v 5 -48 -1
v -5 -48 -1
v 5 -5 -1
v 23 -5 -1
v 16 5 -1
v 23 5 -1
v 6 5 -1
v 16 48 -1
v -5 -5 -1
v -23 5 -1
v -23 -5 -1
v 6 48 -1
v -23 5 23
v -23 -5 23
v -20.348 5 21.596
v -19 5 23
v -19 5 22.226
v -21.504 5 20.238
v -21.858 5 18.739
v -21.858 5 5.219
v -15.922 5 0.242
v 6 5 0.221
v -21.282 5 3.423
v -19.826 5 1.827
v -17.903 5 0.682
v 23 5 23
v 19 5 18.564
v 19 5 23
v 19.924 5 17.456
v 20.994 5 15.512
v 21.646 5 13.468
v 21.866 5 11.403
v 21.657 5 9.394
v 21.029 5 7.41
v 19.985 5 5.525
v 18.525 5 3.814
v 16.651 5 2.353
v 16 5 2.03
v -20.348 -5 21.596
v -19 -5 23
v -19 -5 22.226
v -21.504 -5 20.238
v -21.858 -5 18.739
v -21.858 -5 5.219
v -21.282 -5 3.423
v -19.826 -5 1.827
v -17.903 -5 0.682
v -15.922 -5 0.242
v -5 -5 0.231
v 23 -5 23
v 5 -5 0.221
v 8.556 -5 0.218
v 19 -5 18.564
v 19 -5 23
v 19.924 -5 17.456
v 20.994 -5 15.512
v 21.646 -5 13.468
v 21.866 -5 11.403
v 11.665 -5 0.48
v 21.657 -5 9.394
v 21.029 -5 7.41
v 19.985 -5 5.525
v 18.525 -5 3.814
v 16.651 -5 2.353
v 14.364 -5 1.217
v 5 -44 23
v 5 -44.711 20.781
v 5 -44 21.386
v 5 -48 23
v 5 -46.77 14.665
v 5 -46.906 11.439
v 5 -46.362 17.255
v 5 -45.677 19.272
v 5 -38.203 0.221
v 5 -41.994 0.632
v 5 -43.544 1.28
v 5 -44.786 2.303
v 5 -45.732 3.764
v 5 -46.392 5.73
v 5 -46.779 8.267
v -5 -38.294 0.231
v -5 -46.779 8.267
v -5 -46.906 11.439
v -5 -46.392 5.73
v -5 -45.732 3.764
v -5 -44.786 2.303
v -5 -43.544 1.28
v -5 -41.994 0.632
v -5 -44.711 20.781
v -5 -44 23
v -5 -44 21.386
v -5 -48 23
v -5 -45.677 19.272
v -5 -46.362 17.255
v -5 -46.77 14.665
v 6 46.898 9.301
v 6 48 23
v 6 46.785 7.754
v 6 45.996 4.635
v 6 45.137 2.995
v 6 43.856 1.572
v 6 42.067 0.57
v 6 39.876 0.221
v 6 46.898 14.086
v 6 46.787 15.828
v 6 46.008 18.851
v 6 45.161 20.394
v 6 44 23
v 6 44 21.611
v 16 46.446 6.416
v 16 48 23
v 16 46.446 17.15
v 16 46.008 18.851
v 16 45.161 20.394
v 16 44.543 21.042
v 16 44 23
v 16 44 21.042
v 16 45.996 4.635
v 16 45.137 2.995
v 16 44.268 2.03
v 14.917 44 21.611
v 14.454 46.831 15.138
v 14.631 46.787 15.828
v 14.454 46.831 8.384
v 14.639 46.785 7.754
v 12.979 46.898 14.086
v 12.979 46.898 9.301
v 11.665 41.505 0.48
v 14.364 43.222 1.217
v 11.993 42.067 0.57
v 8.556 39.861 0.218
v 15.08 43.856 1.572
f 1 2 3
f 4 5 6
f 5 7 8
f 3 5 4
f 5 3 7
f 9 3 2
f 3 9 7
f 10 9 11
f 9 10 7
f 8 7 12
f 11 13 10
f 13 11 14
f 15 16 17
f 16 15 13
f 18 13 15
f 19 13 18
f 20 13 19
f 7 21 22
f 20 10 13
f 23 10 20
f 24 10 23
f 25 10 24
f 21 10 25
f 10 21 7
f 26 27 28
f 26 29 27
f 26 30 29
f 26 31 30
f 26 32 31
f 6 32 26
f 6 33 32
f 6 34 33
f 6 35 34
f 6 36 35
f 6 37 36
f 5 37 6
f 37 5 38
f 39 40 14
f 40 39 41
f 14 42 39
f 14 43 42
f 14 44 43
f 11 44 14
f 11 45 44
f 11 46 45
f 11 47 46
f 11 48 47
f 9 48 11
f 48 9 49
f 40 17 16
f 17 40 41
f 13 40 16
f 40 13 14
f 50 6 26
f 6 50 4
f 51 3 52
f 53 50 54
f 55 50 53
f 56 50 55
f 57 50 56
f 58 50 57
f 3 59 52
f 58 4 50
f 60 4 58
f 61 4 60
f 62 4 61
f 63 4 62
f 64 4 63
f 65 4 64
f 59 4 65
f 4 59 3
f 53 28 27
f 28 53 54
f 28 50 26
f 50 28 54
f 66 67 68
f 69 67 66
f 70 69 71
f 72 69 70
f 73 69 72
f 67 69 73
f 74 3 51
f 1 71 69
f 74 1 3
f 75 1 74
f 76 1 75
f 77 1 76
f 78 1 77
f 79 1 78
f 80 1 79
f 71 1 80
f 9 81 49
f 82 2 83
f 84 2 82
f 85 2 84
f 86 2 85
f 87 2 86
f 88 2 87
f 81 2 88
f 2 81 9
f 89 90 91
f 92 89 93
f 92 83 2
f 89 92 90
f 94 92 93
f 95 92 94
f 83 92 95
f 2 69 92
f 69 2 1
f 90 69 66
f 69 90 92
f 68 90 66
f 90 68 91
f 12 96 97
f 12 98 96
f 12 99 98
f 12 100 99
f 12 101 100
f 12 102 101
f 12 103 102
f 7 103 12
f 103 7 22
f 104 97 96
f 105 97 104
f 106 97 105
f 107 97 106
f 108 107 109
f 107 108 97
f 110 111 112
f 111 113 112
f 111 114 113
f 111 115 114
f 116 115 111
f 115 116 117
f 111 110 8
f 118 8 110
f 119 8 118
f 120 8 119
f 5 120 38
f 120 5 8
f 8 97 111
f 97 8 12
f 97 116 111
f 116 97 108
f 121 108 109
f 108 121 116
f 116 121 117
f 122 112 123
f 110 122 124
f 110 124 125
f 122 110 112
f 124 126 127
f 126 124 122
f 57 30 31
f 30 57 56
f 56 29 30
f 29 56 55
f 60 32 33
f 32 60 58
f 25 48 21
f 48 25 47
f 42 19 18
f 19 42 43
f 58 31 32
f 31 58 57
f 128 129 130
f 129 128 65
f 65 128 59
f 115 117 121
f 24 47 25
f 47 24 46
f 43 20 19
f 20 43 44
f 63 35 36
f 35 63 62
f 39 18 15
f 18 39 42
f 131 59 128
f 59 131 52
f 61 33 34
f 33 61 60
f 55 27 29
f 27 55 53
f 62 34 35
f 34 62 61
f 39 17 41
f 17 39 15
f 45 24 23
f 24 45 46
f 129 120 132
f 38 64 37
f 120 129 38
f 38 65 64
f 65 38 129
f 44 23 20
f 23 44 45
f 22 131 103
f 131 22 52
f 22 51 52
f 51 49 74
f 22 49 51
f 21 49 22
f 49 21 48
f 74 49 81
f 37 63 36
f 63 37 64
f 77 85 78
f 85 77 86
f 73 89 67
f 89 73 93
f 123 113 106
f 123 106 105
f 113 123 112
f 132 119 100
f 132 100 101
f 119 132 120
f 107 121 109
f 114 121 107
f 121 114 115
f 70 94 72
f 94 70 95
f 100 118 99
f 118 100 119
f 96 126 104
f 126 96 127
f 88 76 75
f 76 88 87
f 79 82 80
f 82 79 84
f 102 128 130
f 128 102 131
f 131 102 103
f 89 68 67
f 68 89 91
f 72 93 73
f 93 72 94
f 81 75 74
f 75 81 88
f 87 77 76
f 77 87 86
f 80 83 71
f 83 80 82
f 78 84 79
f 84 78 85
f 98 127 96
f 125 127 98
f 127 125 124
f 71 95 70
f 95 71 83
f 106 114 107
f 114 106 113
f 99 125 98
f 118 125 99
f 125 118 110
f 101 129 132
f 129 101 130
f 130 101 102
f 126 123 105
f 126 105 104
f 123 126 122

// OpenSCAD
// file: batt_5200mah-outlines.scad
// Created with the OpenSCAD Polygon extension for Inkscape
// https://github.com/martymcguire/inkscape-openscad-poly
module side_outline() {
  polygon(points=
    [[-21.902, 39.784], [-21.553, 42.132], [-20.627, 43.896], [-19.302, 45.161], [-17.759, 46.008], [-14.736, 46.787], [-12.994, 46.898], [-8.209, 46.898], [-6.662, 46.785], [-3.543, 45.996], [-1.903, 45.137], [-0.480, 43.856], [0.523, 42.067], [0.902, 39.688], [0.902, -37.917], [0.461, -41.994], [-0.188, -43.544], [-1.211, -44.786], [-2.672, -45.732], [-4.638, -46.392], [-7.175, -46.779], [-10.347, -46.906], [-13.573, -46.770], [-16.163, -46.362], [-18.180, -45.677], [-19.689, -44.711], [-20.752, -43.461], [-21.433, -41.922], [-21.795, -40.092], [-21.902, -37.965]]
    , paths=
    [[0, 1, 2, 3, 4, 5, 6, 7, 8, 9, 10, 11, 12, 13, 14, 15, 16, 17, 18, 19, 20, 21, 22, 23, 24, 25, 26, 27, 28, 29, 0]]
    );}
module end_outline() {
  polygon(points=
    [[-16.861, -3.142], [-3.341, -3.142], [-1.842, -3.496], [-0.484, -4.652], [0.496, -6.749], [0.862, -9.927], [0.862, -33.803], [0.591, -36.750], [-0.172, -39.350], [-1.347, -41.588], [-2.857, -43.451], [-4.624, -44.924], [-6.568, -45.994], [-8.612, -46.646], [-10.677, -46.866], [-12.686, -46.657], [-14.670, -46.029], [-16.555, -44.985], [-18.266, -43.525], [-19.727, -41.651], [-20.863, -39.364], [-21.600, -36.665], [-21.862, -33.556], [-21.838, -9.078], [-21.398, -7.097], [-20.253, -5.174], [-18.657, -3.718], [-16.861, -3.142]]
    , paths=
    [[0, 1, 2, 3, 4, 5, 6, 7, 8, 9, 10, 11, 12, 13, 14, 15, 16, 17, 18, 19, 20, 21, 22, 23, 24, 25, 26, 27, 0]]
    );}
module top() {
  polygon(points=
    [[-21.955, 38.487], [-21.733, 40.683], [-21.121, 42.501], [-20.194, 43.969], [-19.032, 45.112], [-16.313, 46.526], [-13.585, 46.951], [11.812, 46.951], [14.454, 46.831], [17.823, 45.993], [19.406, 45.081], [20.722, 43.720], [21.622, 41.820], [21.955, 39.293], [21.955, -38.857], [21.740, -41.254], [21.131, -43.133], [20.181, -44.556], [18.941, -45.583], [17.465, -46.276], [15.804, -46.696], [12.142, -46.959], [-14.327, -46.959], [-16.088, -46.738], [-17.624, -46.139], [-18.933, -45.254], [-20.012, -44.176], [-21.465, -41.810], [-21.955, -39.785]]
    , paths=
    [[0, 1, 2, 3, 4, 5, 6, 7, 8, 9, 10, 11, 12, 13, 14, 15, 16, 17, 18, 19, 20, 21, 22, 23, 24, 25, 26, 27, 28, 0]]
    );}
// file: batt-5200mah.scad
batt_l=94; //93.3mm
batt_w=44; //43.3
batt_h=23; //22.2

include <batt_5200mah-outlines.scad>

module batt_5200mah() {
	intersection(){
		linear_extrude(height=batt_h) top();
		
		translate([-batt_w/1.76, batt_l/2, batt_h*0.96]) {
			rotate([90,-90,0]) {
			  linear_extrude(height=batt_l) end_outline();
			}
		}
	
		translate([-batt_w/2,0,batt_h*0.0475]){
			rotate([0,90,0]) {
				linear_extrude(height=batt_w) side_outline();
			}
		}
	}
}
// main file
include <batt-5200mah.scad>

case_thick = 1;
clip_w = 10;
difference() {
	union() {
		right_clip();
		left_clip();
		bottom_clip();
		top_clip();
	}
	# batt_5200mah();
}

module right_clip() {
	translate([
		-batt_w/2 - case_thick,
		-clip_w/2,
		-case_thick
	]) {
		cube([
			batt_w/2 + case_thick,
			clip_w,
			batt_h/2
		]);
		translate([0,0,batt_h/2]) {
			cube([
				case_thick*4,
				clip_w,
				batt_h/2 + case_thick
			]);
		}
	}
}

module left_clip() {
	 rotate([0,0,180]) right_clip();
}

module bottom_clip() {
	translate([
		-clip_w/2,
		-batt_l/2 - case_thick,
		-case_thick
	]) {
		cube([
			clip_w,
			batt_l/2,
			batt_h/2
		]);
		translate([0,0,batt_h/2]) {
			cube([
				clip_w,
				case_thick*4,
				batt_h/2 + case_thick
			]);
		}
	}
}

module top_clip() {
	translate([batt_w/4,0,0]) {
		rotate([0,0,180]) bottom_clip();
	}
}
